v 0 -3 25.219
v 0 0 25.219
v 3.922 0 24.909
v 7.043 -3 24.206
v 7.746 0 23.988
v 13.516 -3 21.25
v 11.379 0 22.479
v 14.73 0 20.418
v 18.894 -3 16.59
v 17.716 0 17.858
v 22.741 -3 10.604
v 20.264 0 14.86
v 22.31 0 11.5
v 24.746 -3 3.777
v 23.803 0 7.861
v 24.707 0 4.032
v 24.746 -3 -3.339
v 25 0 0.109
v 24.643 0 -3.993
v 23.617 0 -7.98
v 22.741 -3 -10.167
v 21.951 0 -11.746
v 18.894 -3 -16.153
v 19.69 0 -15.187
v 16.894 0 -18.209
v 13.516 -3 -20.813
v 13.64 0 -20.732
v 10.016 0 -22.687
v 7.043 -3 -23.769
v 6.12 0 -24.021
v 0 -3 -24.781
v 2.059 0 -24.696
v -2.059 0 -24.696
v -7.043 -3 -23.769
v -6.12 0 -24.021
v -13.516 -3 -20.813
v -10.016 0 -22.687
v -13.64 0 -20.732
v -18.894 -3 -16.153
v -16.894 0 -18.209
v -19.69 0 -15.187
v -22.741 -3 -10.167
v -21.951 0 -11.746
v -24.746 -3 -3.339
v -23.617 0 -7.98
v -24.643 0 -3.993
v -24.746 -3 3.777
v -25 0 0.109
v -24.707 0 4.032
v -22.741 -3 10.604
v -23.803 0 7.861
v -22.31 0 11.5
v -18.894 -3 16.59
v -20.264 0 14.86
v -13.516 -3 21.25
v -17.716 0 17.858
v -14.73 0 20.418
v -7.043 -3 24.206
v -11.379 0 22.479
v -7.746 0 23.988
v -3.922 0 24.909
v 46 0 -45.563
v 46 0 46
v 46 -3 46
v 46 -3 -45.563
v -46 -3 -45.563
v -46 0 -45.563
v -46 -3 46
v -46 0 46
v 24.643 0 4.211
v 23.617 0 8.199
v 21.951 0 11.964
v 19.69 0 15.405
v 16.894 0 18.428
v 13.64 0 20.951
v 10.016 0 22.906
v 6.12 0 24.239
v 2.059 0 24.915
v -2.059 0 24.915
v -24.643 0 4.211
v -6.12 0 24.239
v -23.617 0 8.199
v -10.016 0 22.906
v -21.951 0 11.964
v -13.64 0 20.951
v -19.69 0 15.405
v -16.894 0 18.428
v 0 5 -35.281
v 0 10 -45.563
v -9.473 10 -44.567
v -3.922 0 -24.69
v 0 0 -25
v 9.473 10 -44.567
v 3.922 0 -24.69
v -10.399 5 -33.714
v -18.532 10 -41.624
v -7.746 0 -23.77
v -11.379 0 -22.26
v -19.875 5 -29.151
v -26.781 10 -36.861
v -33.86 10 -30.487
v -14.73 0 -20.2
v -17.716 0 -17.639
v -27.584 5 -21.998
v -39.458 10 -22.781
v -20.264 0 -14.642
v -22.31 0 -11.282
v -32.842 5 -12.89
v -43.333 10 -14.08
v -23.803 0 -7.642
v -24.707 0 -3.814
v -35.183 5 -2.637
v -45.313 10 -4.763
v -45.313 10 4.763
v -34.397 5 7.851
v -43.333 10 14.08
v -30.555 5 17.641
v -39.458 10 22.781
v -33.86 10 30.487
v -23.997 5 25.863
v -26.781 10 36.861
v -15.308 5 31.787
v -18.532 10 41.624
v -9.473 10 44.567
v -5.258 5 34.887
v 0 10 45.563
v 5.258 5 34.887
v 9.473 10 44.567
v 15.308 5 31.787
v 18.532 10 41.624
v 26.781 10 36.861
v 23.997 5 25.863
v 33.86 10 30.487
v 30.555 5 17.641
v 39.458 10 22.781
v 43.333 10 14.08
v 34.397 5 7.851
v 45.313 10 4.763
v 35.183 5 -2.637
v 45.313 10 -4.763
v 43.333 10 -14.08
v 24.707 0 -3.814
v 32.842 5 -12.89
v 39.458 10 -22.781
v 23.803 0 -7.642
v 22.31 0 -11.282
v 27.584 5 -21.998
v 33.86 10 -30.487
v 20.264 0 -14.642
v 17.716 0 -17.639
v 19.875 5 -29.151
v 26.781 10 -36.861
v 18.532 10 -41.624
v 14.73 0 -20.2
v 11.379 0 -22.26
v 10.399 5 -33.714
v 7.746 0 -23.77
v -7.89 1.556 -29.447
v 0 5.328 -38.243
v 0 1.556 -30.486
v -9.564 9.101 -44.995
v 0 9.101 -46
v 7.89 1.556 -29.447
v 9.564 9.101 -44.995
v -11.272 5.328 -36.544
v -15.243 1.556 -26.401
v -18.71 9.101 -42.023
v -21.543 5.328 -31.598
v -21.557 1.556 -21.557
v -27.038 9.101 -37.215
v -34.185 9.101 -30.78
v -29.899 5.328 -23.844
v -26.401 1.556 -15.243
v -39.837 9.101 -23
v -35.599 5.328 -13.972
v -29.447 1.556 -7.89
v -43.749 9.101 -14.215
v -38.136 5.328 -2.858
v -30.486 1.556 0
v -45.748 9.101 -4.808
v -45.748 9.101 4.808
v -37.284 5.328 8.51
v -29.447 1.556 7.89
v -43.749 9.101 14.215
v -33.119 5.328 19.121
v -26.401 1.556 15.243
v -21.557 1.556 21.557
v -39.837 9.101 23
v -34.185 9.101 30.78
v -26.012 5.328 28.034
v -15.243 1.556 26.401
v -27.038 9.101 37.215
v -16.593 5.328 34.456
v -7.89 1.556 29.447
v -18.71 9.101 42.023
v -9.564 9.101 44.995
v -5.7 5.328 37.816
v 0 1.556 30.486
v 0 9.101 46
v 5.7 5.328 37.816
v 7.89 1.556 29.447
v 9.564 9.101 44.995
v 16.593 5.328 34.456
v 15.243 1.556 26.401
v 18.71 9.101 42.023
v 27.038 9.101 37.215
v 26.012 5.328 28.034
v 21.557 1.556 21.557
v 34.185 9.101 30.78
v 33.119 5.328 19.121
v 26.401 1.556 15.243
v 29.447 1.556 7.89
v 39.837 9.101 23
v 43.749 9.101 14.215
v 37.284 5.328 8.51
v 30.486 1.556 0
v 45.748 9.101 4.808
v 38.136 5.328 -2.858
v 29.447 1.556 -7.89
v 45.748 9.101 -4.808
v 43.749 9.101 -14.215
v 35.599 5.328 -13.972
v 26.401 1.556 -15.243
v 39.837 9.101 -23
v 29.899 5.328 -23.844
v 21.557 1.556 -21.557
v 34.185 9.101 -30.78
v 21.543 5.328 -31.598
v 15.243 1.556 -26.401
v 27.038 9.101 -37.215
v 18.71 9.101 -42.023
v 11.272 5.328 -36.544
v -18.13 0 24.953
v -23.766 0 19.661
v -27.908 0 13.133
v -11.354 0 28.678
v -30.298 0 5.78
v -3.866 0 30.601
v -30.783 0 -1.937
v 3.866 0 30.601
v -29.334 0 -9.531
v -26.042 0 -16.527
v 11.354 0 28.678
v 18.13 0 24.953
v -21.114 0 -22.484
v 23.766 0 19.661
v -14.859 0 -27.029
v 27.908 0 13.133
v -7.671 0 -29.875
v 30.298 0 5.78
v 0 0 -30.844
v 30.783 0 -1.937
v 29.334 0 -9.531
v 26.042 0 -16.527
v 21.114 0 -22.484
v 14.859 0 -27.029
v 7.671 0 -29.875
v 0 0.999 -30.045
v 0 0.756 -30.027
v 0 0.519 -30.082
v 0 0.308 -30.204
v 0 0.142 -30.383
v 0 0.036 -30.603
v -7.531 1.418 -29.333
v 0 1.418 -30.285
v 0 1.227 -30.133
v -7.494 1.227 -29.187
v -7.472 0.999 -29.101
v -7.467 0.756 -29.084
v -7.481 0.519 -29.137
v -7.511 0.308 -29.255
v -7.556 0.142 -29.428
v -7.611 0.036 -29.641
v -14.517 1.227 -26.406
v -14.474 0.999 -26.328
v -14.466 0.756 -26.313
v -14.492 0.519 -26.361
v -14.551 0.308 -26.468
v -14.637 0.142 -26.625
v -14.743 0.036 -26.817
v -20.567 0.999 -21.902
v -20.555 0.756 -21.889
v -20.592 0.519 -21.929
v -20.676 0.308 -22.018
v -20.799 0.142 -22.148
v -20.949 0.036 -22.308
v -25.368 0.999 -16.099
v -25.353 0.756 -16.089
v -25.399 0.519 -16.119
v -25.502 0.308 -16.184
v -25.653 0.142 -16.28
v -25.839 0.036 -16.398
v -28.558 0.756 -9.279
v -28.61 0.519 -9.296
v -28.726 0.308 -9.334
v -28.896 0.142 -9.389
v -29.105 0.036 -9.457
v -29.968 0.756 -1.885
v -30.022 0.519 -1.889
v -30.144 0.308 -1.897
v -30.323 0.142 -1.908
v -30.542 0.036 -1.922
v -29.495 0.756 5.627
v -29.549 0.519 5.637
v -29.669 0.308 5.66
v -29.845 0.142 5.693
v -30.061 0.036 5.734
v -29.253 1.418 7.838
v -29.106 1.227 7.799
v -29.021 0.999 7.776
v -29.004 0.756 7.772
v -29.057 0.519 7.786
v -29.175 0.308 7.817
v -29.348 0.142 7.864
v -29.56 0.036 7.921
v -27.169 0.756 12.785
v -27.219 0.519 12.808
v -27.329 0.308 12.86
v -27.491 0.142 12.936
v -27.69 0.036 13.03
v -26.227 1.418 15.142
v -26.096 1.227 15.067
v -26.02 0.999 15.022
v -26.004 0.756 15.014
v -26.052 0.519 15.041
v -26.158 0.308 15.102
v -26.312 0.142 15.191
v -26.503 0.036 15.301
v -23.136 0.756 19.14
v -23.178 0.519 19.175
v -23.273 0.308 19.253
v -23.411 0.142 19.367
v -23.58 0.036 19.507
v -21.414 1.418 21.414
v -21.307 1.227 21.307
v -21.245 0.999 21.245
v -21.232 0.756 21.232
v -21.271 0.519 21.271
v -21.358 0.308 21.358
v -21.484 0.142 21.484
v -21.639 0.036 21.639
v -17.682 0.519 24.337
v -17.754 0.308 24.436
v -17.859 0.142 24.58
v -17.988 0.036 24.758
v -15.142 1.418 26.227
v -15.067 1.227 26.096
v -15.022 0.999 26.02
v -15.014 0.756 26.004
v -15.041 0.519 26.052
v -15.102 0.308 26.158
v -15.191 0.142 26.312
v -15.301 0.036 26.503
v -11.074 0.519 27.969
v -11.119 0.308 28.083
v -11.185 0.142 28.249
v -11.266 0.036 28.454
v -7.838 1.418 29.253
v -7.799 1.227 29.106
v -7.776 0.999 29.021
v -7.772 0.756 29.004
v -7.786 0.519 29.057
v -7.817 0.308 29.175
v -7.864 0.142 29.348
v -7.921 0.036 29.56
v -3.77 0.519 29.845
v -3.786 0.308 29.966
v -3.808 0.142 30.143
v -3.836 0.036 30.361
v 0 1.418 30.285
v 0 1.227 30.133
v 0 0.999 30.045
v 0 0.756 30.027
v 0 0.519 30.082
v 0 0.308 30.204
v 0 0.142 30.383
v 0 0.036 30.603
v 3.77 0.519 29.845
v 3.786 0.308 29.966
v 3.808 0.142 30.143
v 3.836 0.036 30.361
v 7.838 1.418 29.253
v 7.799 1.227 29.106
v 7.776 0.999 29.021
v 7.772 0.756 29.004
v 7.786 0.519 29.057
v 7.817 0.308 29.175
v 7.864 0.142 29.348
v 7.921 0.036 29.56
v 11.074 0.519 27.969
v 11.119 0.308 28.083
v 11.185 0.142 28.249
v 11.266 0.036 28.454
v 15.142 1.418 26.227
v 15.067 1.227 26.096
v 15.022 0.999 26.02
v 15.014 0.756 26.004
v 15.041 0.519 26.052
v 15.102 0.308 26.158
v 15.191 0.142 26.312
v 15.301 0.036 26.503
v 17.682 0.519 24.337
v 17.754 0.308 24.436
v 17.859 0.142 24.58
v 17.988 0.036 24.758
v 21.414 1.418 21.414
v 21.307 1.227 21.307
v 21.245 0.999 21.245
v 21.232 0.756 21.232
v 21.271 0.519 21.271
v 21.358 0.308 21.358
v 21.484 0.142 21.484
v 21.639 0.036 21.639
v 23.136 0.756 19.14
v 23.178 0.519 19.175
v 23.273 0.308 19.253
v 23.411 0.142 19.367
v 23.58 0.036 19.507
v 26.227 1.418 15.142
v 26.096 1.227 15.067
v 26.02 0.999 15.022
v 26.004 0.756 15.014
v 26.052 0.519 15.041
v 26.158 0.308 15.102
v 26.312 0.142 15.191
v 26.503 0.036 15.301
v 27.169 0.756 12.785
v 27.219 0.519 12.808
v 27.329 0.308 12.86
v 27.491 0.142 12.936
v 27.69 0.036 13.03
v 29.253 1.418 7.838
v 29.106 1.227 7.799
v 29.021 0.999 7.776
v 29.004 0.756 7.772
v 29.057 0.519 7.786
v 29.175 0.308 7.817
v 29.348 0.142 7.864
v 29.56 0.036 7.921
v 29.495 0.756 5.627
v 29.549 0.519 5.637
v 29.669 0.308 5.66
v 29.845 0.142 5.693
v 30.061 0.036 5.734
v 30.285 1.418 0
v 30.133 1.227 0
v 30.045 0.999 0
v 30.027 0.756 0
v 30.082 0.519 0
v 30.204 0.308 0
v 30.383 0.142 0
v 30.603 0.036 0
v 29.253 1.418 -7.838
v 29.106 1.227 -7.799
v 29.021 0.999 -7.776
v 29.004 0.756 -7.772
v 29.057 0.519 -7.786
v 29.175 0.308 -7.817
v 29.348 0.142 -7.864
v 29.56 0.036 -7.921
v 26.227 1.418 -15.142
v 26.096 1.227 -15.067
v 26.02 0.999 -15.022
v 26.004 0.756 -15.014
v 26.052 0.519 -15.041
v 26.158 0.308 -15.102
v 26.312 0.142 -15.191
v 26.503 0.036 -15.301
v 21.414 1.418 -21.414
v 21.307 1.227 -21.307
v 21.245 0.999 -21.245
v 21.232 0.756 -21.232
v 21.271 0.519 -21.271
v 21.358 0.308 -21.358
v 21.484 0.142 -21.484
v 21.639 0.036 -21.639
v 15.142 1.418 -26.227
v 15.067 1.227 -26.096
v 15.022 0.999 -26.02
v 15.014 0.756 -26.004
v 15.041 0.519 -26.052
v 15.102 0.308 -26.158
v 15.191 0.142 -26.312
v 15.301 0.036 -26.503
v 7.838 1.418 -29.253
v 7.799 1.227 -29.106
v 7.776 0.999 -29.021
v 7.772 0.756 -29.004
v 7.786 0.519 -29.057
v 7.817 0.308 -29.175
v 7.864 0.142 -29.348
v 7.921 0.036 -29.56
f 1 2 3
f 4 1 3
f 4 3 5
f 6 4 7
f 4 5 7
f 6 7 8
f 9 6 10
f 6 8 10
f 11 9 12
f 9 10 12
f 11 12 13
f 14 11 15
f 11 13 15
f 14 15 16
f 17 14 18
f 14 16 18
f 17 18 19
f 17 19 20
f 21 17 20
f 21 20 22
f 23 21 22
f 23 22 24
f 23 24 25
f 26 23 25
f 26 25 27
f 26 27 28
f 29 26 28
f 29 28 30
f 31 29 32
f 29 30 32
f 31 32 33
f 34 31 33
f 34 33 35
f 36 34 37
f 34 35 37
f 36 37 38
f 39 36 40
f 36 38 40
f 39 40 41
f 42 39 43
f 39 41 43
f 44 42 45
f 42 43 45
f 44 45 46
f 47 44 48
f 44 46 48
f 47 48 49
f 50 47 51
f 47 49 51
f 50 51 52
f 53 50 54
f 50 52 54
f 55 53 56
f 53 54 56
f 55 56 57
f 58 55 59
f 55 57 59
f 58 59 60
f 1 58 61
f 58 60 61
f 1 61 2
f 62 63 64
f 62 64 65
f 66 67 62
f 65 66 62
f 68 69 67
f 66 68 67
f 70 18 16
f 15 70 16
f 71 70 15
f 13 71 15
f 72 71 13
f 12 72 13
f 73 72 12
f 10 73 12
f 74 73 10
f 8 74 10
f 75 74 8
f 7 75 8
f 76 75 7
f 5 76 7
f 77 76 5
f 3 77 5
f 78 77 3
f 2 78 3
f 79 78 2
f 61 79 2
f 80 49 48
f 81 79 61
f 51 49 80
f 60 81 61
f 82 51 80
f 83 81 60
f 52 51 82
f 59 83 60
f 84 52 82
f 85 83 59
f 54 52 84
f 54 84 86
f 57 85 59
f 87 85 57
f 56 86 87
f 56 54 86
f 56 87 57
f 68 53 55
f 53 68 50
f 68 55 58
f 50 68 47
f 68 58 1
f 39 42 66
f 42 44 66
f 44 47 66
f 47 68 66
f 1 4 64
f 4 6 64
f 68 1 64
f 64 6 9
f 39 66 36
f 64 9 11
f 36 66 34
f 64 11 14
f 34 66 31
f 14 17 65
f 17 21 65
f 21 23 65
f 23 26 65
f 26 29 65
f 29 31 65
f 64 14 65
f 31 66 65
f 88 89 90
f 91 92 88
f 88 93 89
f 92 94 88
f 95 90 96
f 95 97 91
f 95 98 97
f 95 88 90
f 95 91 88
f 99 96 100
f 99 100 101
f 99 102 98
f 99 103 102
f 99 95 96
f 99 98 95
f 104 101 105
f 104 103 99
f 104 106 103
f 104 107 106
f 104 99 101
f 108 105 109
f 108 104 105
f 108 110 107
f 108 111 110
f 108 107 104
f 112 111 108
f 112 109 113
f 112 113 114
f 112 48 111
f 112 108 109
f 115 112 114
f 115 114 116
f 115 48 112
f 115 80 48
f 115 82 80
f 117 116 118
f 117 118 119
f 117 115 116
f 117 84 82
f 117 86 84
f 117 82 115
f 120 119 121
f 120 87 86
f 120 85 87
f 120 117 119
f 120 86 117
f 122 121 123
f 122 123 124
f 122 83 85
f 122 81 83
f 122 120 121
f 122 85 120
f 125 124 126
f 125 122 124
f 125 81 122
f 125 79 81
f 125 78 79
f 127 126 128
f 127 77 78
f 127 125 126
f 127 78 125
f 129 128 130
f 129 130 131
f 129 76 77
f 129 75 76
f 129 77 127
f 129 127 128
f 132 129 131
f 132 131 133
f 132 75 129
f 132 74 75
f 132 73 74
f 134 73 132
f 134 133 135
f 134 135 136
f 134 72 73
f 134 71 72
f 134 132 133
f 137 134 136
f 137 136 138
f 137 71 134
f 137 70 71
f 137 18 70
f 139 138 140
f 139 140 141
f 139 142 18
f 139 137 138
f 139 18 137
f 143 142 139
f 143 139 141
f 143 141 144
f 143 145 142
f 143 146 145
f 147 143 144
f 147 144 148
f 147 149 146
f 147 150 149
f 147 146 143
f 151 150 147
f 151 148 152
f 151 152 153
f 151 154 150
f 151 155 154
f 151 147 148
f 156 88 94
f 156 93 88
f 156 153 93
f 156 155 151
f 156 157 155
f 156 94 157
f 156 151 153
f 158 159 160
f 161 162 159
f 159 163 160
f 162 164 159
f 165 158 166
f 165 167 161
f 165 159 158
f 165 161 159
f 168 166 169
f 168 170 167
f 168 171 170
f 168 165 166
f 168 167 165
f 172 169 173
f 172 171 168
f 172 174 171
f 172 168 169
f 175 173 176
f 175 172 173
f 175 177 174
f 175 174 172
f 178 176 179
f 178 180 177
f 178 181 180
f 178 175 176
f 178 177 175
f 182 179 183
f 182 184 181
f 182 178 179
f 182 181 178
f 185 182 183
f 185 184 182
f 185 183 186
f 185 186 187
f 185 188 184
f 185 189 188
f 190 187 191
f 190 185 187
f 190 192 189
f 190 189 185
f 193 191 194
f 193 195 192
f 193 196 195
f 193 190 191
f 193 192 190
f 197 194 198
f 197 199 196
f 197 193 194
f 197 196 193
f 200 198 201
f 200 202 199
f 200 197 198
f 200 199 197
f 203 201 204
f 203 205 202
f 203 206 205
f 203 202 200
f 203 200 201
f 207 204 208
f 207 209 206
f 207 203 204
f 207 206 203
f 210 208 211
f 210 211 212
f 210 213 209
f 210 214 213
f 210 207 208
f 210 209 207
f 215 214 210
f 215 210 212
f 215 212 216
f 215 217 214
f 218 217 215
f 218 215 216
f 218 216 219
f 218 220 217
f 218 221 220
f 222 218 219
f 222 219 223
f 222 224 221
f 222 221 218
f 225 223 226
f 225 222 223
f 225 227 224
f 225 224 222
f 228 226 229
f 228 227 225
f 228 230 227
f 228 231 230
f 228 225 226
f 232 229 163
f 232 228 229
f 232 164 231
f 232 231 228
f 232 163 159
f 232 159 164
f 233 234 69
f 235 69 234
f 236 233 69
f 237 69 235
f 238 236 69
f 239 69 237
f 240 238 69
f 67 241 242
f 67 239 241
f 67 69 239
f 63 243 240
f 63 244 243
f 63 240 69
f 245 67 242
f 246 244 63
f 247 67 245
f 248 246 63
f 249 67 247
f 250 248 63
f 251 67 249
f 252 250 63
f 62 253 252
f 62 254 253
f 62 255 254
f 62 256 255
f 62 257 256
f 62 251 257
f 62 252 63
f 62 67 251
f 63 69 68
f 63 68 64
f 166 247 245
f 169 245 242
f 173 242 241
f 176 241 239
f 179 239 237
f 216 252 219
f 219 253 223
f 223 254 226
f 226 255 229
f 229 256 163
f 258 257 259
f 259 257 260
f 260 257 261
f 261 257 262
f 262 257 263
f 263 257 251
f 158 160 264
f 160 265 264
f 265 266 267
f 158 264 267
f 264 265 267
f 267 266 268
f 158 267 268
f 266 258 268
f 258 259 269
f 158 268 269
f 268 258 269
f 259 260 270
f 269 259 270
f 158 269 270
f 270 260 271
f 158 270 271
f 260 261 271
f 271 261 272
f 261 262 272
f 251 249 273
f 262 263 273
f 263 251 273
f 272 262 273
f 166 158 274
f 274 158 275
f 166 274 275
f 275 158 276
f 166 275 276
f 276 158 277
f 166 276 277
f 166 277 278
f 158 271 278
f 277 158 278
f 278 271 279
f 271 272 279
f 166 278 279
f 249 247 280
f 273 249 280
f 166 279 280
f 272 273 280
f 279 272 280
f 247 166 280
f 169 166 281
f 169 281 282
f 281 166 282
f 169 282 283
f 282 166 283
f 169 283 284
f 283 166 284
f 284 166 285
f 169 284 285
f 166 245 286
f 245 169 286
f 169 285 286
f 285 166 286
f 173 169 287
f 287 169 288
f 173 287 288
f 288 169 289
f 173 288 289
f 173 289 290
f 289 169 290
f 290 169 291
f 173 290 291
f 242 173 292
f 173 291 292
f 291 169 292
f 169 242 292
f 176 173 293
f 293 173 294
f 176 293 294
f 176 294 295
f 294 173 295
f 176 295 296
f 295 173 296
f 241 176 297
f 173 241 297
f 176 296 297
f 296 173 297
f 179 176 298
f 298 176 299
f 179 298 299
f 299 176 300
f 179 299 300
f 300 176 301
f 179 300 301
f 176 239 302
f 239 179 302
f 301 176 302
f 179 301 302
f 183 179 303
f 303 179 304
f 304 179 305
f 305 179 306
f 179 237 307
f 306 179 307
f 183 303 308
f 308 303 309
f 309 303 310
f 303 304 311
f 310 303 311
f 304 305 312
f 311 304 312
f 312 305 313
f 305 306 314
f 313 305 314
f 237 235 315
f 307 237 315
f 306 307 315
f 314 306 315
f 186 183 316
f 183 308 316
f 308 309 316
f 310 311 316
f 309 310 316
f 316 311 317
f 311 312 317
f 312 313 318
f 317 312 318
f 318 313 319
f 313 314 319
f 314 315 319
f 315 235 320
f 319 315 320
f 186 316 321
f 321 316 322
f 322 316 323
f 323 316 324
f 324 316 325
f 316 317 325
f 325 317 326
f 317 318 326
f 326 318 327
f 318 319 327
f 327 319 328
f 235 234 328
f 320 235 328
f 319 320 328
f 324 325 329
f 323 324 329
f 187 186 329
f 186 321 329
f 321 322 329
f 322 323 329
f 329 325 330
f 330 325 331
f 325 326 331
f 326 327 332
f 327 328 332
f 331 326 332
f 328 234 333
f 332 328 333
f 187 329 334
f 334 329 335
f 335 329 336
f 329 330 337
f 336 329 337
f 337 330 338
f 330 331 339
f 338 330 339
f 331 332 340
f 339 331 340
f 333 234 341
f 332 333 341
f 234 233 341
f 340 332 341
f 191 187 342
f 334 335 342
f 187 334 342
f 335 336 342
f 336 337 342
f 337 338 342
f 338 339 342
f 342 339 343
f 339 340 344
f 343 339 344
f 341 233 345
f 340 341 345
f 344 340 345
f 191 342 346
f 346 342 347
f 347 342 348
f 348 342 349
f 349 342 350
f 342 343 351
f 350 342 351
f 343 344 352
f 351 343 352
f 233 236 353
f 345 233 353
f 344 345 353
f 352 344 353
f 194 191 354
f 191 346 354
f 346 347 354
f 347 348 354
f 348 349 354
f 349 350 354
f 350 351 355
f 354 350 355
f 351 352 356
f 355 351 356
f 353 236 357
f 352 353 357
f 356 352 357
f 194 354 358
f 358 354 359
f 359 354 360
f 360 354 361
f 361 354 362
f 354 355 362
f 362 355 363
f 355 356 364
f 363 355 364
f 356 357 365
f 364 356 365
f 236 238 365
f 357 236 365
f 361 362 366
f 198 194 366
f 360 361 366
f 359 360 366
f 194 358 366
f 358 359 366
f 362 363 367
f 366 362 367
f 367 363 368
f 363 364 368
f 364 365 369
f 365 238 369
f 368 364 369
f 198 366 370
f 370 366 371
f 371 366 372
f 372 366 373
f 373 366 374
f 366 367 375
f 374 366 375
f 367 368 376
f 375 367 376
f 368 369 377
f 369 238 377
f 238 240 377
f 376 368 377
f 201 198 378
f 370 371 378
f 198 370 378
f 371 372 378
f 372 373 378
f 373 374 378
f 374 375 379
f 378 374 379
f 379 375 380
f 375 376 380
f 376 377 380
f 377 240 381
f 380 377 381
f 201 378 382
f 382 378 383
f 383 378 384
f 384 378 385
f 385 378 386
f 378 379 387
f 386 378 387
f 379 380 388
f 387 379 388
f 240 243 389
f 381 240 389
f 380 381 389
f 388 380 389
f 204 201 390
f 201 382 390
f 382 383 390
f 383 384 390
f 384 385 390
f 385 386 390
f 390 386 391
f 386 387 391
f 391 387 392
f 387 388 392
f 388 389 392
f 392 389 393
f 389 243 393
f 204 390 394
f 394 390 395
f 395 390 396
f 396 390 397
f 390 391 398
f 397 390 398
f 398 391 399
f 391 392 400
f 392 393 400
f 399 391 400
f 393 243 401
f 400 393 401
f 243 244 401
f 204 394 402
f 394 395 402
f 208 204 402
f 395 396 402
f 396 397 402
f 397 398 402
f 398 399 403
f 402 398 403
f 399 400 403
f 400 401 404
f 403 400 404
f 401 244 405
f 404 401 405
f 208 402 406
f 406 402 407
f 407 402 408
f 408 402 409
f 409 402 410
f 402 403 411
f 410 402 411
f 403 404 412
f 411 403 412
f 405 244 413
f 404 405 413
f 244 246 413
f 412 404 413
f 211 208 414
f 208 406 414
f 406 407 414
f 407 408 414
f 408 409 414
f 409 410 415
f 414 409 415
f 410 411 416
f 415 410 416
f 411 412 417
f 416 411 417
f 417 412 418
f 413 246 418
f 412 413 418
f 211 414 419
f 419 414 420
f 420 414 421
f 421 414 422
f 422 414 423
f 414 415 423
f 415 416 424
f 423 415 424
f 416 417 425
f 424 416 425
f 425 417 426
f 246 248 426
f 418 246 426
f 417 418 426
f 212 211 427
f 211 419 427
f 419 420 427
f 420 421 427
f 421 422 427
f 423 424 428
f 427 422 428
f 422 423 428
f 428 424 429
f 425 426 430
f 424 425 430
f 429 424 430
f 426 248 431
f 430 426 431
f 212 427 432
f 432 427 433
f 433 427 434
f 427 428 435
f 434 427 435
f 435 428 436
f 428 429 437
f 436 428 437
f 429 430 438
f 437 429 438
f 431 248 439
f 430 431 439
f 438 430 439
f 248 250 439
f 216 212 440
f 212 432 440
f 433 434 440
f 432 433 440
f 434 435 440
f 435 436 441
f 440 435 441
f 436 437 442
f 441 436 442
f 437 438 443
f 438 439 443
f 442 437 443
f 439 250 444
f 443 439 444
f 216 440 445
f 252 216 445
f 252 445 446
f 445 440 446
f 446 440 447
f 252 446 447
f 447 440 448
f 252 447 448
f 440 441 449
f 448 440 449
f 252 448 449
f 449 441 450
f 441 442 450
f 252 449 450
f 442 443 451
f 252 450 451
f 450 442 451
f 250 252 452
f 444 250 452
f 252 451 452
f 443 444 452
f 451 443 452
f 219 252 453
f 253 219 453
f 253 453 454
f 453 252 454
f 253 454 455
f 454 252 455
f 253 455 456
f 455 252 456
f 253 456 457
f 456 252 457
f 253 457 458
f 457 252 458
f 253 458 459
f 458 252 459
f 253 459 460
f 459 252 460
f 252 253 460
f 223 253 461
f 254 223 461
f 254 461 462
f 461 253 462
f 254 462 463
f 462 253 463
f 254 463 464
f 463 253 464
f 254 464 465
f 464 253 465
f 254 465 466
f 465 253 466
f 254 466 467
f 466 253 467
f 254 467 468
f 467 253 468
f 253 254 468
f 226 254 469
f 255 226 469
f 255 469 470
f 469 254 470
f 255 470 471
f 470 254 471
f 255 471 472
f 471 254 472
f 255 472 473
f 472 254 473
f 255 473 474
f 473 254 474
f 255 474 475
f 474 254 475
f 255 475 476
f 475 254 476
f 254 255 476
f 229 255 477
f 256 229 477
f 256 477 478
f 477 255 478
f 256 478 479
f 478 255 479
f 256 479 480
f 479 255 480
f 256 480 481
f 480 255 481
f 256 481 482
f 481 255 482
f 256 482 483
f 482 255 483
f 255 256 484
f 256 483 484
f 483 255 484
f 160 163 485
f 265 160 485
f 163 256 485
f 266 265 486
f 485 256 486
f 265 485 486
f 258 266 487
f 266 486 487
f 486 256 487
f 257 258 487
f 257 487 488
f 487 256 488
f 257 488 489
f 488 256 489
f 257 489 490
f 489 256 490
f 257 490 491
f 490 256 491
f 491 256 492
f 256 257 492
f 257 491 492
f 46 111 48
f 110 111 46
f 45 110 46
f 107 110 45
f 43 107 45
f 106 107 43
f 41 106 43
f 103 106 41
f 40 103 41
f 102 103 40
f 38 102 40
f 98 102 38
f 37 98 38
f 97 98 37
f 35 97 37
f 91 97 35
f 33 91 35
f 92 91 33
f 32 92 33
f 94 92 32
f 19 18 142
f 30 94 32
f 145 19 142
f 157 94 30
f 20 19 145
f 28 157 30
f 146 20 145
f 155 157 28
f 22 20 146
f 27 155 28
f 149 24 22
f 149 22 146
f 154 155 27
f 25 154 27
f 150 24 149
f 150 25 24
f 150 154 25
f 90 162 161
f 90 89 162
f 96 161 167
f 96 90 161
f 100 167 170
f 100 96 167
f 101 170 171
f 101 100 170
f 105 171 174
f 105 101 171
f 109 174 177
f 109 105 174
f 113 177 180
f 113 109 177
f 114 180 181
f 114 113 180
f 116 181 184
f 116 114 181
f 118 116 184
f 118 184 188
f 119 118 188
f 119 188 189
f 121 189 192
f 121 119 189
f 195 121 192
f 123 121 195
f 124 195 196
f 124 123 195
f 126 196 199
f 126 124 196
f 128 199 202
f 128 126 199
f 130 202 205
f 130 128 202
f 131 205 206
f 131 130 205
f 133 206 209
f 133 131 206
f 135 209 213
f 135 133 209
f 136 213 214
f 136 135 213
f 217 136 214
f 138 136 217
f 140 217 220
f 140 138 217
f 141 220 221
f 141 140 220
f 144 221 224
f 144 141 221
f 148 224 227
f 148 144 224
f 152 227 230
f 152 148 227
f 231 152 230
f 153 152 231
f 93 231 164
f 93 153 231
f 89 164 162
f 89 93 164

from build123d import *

# Parameters (mm, degrees)
SKETCH2_W           = 92
SKETCH2_H           = 91.562656452
SKETCH2_R           = 25
BOSS_EXTRUDE1_DEPTH = 3


with BuildPart() as part:
    # Sketch1 → Revolve1 (revolve)
    with BuildSketch(Plane.XY, mode=Mode.PRIVATE) as revolve1_sk:
        Polygon((-27.28653196, 0), (-46, 9.100705487), (-45.562656452, 10), (-25, 0), align=None)
    revolve(revolve1_sk.sketch.rotate(Axis((0, 0, 0), (0, 1, 0)), 270), axis=Axis((0, 0, 0), (0, 1, 0)))



with BuildPart() as body_2:
    # Sketch2 → Boss-Extrude1 (new body)
    with BuildSketch(Plane(origin=(0, 0, 0), x_dir=(1, 0, 0), z_dir=(0, 1, 0))):
        with Locations((0, -0.218671774)):
            Rectangle(SKETCH2_W, SKETCH2_H)
        with Locations(Location((0, -0.218671774, 0), (0, 0, 270))):
            Circle(SKETCH2_R, mode=Mode.SUBTRACT)
    extrude(amount=-BOSS_EXTRUDE1_DEPTH)


with BuildPart() as part_1:
    add(part.part)

    add(body_2.part)  # Revolve2 merges body 2
    # Sketch3 → Revolve2 (revolve)
    with BuildSketch(Plane.XY, mode=Mode.PRIVATE) as revolve2_sk:
        with BuildLine():
            Line((-27.28653196, 0), (-30.485609044, 1.555770331))
            ThreePointArc((-30.485609044, 1.555770331), (-30.045608993, 0.6353225), (-30.843850544, 0))
            Line((-30.843850544, 0), (-27.28653196, 0))
        make_face()
    revolve(revolve2_sk.sketch.rotate(Axis((0, 0, 0), (0, 1, 0)), 270), axis=Axis((0, 0, 0), (0, 1, 0)))


solid = part_1.part
